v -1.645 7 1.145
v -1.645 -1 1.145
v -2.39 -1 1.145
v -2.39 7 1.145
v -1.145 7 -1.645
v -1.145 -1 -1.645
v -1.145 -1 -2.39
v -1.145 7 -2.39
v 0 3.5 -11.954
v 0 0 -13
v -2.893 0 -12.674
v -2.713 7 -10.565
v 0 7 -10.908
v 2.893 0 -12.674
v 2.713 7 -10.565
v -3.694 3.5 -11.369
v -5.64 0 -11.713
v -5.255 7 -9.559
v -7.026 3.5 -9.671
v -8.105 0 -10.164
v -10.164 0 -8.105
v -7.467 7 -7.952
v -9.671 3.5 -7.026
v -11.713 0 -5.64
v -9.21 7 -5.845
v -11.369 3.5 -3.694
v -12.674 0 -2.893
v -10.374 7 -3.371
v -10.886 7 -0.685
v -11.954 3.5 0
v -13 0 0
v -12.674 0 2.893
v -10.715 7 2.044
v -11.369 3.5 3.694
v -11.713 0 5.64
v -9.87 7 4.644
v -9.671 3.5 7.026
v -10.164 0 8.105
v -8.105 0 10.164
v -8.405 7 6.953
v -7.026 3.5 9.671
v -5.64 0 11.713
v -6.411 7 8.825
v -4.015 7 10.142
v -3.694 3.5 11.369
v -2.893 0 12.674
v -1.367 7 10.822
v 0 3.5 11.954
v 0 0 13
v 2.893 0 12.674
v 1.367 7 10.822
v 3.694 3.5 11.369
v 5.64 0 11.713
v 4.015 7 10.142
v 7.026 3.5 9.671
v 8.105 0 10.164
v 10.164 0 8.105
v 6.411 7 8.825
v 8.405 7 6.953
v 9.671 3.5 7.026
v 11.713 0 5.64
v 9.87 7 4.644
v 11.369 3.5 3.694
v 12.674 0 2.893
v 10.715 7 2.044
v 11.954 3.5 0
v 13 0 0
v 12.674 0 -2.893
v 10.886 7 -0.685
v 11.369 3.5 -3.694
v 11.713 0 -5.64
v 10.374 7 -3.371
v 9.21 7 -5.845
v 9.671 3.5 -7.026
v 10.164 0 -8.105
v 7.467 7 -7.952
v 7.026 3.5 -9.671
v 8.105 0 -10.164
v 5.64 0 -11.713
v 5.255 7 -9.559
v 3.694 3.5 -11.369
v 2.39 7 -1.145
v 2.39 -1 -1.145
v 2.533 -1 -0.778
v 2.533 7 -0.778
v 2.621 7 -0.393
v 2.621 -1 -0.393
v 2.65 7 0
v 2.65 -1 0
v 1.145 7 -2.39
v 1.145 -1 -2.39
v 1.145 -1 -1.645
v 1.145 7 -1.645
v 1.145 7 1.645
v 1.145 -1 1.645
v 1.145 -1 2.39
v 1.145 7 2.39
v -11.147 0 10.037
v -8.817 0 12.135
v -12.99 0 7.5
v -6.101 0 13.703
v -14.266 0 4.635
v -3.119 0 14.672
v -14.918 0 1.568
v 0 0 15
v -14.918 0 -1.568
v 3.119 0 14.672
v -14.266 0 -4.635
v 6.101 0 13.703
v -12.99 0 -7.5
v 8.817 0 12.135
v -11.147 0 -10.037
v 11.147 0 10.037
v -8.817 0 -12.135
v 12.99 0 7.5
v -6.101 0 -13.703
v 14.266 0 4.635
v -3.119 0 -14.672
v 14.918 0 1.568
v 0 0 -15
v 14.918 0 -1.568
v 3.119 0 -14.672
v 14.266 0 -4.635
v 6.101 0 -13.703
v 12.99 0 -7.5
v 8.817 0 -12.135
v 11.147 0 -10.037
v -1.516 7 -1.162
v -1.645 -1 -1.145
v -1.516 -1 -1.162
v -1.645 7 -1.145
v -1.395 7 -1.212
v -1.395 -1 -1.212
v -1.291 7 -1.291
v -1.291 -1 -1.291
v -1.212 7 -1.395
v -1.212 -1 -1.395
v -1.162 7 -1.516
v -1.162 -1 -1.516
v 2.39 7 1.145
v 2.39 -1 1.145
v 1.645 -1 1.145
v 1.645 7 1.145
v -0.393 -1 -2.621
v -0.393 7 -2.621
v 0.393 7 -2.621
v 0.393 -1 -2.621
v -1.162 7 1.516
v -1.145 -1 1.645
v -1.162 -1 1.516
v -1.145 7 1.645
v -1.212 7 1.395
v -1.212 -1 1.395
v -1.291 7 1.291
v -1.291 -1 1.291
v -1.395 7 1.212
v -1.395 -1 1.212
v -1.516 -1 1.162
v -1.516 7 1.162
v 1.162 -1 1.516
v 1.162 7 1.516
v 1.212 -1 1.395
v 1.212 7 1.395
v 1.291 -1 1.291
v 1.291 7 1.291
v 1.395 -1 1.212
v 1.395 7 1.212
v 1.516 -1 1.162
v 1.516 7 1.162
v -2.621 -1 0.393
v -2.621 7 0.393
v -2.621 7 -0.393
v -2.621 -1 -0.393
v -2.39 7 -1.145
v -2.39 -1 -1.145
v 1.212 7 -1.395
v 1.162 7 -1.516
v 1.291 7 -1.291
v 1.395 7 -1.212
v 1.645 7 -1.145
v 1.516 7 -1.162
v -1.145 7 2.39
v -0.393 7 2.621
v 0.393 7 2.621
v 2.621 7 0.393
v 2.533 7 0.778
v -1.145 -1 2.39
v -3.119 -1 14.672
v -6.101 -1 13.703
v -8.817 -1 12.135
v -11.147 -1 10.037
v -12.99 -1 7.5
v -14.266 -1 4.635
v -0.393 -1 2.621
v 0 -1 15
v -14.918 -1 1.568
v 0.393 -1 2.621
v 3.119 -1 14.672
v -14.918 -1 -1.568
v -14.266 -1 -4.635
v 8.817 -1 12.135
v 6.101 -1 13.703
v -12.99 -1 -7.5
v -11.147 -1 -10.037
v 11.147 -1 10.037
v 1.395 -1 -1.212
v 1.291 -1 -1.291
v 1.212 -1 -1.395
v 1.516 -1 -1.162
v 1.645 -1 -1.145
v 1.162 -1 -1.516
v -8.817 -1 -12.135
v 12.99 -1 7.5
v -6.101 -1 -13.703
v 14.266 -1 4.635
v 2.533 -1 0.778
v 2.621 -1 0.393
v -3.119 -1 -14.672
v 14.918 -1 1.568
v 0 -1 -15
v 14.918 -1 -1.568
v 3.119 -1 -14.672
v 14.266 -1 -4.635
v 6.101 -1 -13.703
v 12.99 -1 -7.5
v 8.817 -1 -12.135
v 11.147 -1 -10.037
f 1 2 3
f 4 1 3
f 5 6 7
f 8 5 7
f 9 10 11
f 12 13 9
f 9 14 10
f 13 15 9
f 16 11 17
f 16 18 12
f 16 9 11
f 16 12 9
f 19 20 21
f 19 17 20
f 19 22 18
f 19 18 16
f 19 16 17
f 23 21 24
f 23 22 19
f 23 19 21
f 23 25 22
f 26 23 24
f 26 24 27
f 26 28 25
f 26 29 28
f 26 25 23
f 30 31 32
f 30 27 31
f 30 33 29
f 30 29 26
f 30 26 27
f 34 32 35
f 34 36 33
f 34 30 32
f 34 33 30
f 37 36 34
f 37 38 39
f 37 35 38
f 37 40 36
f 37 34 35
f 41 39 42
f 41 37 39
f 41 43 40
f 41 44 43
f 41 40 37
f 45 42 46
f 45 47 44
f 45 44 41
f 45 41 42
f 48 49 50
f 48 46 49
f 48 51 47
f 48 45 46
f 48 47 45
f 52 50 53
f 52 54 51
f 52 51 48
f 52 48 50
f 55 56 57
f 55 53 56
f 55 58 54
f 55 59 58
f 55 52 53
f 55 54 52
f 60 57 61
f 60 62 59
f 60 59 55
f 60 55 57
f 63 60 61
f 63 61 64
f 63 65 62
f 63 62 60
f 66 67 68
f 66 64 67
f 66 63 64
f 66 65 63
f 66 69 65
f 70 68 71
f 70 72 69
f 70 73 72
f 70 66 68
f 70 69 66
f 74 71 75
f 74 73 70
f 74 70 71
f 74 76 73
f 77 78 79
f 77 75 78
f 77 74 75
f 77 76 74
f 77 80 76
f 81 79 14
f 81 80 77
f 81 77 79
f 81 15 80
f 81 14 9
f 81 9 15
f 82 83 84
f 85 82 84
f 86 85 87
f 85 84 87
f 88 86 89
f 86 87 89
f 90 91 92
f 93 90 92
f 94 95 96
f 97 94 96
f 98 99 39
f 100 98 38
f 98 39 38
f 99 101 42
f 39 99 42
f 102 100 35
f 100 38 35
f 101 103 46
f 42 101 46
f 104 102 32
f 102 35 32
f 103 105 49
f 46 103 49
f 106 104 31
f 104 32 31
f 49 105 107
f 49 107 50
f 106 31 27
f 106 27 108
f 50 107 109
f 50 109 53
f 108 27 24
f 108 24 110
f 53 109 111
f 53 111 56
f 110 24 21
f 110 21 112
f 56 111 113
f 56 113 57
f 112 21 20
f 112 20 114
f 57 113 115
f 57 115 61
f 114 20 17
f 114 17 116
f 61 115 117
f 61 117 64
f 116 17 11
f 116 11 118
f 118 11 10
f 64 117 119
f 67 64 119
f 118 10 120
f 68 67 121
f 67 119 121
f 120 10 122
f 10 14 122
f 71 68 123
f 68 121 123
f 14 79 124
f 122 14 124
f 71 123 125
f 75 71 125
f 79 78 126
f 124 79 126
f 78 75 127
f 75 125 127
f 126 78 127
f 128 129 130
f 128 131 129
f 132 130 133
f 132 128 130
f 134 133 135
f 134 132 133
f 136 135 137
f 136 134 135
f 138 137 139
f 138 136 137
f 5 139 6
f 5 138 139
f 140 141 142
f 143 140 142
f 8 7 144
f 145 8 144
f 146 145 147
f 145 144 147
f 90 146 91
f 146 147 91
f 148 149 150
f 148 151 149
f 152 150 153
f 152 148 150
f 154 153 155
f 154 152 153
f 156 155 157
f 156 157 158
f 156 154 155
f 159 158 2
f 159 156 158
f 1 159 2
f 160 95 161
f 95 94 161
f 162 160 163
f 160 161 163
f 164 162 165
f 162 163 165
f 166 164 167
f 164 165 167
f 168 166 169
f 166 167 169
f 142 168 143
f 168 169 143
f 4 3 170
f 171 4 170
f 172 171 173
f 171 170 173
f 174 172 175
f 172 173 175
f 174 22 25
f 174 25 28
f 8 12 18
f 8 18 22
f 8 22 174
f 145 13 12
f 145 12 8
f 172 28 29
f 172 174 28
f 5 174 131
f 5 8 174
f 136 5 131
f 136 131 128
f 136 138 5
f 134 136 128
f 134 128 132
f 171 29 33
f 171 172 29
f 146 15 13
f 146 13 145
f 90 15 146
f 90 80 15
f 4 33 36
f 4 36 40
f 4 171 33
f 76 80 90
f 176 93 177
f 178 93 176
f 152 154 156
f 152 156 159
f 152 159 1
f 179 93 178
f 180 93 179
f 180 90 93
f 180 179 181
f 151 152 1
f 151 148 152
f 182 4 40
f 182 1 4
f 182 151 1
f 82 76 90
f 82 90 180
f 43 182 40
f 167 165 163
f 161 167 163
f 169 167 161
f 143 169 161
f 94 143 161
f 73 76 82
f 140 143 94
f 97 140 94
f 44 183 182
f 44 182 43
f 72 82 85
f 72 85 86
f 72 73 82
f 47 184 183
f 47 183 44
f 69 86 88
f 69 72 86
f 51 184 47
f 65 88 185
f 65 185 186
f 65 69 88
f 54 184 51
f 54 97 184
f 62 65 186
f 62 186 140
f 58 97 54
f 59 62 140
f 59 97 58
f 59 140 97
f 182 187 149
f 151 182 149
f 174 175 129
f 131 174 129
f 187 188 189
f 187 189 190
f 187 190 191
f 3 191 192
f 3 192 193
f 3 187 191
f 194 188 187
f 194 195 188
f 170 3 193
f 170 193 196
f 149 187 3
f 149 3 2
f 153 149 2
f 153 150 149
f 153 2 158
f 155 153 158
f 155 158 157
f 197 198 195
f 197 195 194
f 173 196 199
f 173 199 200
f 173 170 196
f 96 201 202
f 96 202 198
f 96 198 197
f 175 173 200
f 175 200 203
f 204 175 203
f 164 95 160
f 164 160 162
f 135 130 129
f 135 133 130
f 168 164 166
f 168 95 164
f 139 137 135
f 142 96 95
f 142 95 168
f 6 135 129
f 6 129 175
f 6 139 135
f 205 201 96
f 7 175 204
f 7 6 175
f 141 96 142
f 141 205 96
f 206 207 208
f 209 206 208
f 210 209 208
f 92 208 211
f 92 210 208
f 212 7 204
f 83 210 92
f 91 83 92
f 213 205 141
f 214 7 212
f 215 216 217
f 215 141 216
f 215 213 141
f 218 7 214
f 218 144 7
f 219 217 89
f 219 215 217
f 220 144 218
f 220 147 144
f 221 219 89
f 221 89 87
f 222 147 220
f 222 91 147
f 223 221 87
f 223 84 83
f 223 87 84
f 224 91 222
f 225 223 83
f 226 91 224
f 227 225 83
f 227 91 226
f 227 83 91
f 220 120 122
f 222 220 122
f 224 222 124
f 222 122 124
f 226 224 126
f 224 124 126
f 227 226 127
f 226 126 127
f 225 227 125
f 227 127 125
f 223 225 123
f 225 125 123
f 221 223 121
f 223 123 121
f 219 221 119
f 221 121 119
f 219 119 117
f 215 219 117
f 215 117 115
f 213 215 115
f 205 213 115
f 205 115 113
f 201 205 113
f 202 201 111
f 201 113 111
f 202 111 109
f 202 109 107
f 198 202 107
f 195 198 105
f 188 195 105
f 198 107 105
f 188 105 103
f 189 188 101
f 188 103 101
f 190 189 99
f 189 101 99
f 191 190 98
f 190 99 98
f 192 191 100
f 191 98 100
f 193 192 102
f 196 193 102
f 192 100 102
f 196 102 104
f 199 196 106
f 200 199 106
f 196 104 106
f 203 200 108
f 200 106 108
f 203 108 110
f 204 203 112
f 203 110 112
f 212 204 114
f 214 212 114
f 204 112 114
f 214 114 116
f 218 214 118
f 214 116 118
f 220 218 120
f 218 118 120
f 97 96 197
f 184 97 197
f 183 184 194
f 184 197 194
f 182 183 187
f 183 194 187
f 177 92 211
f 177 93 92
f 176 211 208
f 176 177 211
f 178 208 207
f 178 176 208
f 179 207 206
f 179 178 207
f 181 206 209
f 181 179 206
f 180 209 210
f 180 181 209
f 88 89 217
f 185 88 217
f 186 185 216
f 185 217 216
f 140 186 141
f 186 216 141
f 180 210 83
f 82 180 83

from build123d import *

# Parameters (mm, degrees)
SKETCH1_R           = 13
BOSS_EXTRUDE1_DEPTH = 7
SKETCH3_R           = 15
BOSS_EXTRUDE2_DEPTH = 1
SKETCH4_W           = 2.29
SKETCH4_H           = 2.29
CUT_EXTRUDE1_DEPTH  = 23.671568098
FILLET1_R           = 0.5


with BuildPart() as part:
    # Sketch1 → Boss-Extrude1 (new body)
    with BuildSketch(Plane(origin=(0, 0, 0), x_dir=(1, 0, 0), z_dir=(0, 1, 0))):
        with Locations(Location((0, 0, 0), (0, 0, 270))):
            Circle(SKETCH1_R)
    extrude(amount=BOSS_EXTRUDE1_DEPTH)

    # Sketch2 → Cut-Revolve1 (revolve, cut)
    with BuildSketch(Plane(origin=(0, 0, 0), x_dir=(0, 0, -1), z_dir=(1, 0, 0)), mode=Mode.PRIVATE) as cut_revolve1_sk:
        Polygon((-13, 0), (-10.907887029, 7), (-13, 7), align=None)
    revolve(cut_revolve1_sk.sketch.rotate(Axis((0, 0, 0), (0, 1, 0)), 180), axis=Axis((0, 0, 0), (0, 1, 0)), mode=Mode.SUBTRACT)

    # Sketch3 → Boss-Extrude2 (add)
    with BuildSketch(Plane(origin=(0, 0, 0), x_dir=(-1, 0, 0), z_dir=(0, -1, 0))):
        with Locations(Location((0, 0, 0), (0, 0, 90))):
            Circle(SKETCH3_R)
    extrude(amount=BOSS_EXTRUDE2_DEPTH)

    # Sketch4 → Cut-Extrude1 (cut, through all)
    with BuildSketch(Plane.XZ.offset(1)):
        Rectangle(SKETCH4_W, SKETCH4_H)
        with BuildLine():
            Line((-2.389869243, -1.145), (-1.145, -1.145))
            Line((-1.145, -1.145), (-1.145, 1.145))
            Line((-1.145, 1.145), (-2.389869243, 1.145))
            ThreePointArc((-2.389869243, 1.145), (-2.65, 0), (-2.389869243, -1.145))
        make_face()
        with BuildLine():
            Line((-1.145, 1.145), (1.145, 1.145))
            Line((1.145, 1.145), (1.145, 2.389869243))
            ThreePointArc((1.145, 2.389869243), (0, 2.65), (-1.145, 2.389869243))
            Line((-1.145, 2.389869243), (-1.145, 1.145))
        make_face()
        with BuildLine():
            Line((1.145, 1.145), (1.145, -1.145))
            Line((1.145, -1.145), (2.389869243, -1.145))
            ThreePointArc((2.389869243, -1.145), (2.584149134, -0.587088795), (2.65, 0))
            ThreePointArc((2.65, 0), (2.584149134, 0.587088795), (2.389869243, 1.145))
            Line((2.389869243, 1.145), (1.145, 1.145))
        make_face()
        with BuildLine():
            ThreePointArc((-1.145, -2.389869243), (0, -2.65), (1.145, -2.389869243))
            Line((1.145, -2.389869243), (1.145, -1.145))
            Line((1.145, -1.145), (-1.145, -1.145))
            Line((-1.145, -1.145), (-1.145, -2.389869243))
        make_face()
    extrude(amount=-CUT_EXTRUDE1_DEPTH, mode=Mode.SUBTRACT)

    # Fillet1
    fillet1_edges = [part.edges().sort_by_distance(p)[0] for p in [
        (-1.145, 3, 1.145),
        (1.145, 3, 1.145),
        (1.145, 3, -1.145),
        (-1.145, 3, -1.145),
    ]]
    fillet(fillet1_edges, radius=FILLET1_R)


solid = part.part
